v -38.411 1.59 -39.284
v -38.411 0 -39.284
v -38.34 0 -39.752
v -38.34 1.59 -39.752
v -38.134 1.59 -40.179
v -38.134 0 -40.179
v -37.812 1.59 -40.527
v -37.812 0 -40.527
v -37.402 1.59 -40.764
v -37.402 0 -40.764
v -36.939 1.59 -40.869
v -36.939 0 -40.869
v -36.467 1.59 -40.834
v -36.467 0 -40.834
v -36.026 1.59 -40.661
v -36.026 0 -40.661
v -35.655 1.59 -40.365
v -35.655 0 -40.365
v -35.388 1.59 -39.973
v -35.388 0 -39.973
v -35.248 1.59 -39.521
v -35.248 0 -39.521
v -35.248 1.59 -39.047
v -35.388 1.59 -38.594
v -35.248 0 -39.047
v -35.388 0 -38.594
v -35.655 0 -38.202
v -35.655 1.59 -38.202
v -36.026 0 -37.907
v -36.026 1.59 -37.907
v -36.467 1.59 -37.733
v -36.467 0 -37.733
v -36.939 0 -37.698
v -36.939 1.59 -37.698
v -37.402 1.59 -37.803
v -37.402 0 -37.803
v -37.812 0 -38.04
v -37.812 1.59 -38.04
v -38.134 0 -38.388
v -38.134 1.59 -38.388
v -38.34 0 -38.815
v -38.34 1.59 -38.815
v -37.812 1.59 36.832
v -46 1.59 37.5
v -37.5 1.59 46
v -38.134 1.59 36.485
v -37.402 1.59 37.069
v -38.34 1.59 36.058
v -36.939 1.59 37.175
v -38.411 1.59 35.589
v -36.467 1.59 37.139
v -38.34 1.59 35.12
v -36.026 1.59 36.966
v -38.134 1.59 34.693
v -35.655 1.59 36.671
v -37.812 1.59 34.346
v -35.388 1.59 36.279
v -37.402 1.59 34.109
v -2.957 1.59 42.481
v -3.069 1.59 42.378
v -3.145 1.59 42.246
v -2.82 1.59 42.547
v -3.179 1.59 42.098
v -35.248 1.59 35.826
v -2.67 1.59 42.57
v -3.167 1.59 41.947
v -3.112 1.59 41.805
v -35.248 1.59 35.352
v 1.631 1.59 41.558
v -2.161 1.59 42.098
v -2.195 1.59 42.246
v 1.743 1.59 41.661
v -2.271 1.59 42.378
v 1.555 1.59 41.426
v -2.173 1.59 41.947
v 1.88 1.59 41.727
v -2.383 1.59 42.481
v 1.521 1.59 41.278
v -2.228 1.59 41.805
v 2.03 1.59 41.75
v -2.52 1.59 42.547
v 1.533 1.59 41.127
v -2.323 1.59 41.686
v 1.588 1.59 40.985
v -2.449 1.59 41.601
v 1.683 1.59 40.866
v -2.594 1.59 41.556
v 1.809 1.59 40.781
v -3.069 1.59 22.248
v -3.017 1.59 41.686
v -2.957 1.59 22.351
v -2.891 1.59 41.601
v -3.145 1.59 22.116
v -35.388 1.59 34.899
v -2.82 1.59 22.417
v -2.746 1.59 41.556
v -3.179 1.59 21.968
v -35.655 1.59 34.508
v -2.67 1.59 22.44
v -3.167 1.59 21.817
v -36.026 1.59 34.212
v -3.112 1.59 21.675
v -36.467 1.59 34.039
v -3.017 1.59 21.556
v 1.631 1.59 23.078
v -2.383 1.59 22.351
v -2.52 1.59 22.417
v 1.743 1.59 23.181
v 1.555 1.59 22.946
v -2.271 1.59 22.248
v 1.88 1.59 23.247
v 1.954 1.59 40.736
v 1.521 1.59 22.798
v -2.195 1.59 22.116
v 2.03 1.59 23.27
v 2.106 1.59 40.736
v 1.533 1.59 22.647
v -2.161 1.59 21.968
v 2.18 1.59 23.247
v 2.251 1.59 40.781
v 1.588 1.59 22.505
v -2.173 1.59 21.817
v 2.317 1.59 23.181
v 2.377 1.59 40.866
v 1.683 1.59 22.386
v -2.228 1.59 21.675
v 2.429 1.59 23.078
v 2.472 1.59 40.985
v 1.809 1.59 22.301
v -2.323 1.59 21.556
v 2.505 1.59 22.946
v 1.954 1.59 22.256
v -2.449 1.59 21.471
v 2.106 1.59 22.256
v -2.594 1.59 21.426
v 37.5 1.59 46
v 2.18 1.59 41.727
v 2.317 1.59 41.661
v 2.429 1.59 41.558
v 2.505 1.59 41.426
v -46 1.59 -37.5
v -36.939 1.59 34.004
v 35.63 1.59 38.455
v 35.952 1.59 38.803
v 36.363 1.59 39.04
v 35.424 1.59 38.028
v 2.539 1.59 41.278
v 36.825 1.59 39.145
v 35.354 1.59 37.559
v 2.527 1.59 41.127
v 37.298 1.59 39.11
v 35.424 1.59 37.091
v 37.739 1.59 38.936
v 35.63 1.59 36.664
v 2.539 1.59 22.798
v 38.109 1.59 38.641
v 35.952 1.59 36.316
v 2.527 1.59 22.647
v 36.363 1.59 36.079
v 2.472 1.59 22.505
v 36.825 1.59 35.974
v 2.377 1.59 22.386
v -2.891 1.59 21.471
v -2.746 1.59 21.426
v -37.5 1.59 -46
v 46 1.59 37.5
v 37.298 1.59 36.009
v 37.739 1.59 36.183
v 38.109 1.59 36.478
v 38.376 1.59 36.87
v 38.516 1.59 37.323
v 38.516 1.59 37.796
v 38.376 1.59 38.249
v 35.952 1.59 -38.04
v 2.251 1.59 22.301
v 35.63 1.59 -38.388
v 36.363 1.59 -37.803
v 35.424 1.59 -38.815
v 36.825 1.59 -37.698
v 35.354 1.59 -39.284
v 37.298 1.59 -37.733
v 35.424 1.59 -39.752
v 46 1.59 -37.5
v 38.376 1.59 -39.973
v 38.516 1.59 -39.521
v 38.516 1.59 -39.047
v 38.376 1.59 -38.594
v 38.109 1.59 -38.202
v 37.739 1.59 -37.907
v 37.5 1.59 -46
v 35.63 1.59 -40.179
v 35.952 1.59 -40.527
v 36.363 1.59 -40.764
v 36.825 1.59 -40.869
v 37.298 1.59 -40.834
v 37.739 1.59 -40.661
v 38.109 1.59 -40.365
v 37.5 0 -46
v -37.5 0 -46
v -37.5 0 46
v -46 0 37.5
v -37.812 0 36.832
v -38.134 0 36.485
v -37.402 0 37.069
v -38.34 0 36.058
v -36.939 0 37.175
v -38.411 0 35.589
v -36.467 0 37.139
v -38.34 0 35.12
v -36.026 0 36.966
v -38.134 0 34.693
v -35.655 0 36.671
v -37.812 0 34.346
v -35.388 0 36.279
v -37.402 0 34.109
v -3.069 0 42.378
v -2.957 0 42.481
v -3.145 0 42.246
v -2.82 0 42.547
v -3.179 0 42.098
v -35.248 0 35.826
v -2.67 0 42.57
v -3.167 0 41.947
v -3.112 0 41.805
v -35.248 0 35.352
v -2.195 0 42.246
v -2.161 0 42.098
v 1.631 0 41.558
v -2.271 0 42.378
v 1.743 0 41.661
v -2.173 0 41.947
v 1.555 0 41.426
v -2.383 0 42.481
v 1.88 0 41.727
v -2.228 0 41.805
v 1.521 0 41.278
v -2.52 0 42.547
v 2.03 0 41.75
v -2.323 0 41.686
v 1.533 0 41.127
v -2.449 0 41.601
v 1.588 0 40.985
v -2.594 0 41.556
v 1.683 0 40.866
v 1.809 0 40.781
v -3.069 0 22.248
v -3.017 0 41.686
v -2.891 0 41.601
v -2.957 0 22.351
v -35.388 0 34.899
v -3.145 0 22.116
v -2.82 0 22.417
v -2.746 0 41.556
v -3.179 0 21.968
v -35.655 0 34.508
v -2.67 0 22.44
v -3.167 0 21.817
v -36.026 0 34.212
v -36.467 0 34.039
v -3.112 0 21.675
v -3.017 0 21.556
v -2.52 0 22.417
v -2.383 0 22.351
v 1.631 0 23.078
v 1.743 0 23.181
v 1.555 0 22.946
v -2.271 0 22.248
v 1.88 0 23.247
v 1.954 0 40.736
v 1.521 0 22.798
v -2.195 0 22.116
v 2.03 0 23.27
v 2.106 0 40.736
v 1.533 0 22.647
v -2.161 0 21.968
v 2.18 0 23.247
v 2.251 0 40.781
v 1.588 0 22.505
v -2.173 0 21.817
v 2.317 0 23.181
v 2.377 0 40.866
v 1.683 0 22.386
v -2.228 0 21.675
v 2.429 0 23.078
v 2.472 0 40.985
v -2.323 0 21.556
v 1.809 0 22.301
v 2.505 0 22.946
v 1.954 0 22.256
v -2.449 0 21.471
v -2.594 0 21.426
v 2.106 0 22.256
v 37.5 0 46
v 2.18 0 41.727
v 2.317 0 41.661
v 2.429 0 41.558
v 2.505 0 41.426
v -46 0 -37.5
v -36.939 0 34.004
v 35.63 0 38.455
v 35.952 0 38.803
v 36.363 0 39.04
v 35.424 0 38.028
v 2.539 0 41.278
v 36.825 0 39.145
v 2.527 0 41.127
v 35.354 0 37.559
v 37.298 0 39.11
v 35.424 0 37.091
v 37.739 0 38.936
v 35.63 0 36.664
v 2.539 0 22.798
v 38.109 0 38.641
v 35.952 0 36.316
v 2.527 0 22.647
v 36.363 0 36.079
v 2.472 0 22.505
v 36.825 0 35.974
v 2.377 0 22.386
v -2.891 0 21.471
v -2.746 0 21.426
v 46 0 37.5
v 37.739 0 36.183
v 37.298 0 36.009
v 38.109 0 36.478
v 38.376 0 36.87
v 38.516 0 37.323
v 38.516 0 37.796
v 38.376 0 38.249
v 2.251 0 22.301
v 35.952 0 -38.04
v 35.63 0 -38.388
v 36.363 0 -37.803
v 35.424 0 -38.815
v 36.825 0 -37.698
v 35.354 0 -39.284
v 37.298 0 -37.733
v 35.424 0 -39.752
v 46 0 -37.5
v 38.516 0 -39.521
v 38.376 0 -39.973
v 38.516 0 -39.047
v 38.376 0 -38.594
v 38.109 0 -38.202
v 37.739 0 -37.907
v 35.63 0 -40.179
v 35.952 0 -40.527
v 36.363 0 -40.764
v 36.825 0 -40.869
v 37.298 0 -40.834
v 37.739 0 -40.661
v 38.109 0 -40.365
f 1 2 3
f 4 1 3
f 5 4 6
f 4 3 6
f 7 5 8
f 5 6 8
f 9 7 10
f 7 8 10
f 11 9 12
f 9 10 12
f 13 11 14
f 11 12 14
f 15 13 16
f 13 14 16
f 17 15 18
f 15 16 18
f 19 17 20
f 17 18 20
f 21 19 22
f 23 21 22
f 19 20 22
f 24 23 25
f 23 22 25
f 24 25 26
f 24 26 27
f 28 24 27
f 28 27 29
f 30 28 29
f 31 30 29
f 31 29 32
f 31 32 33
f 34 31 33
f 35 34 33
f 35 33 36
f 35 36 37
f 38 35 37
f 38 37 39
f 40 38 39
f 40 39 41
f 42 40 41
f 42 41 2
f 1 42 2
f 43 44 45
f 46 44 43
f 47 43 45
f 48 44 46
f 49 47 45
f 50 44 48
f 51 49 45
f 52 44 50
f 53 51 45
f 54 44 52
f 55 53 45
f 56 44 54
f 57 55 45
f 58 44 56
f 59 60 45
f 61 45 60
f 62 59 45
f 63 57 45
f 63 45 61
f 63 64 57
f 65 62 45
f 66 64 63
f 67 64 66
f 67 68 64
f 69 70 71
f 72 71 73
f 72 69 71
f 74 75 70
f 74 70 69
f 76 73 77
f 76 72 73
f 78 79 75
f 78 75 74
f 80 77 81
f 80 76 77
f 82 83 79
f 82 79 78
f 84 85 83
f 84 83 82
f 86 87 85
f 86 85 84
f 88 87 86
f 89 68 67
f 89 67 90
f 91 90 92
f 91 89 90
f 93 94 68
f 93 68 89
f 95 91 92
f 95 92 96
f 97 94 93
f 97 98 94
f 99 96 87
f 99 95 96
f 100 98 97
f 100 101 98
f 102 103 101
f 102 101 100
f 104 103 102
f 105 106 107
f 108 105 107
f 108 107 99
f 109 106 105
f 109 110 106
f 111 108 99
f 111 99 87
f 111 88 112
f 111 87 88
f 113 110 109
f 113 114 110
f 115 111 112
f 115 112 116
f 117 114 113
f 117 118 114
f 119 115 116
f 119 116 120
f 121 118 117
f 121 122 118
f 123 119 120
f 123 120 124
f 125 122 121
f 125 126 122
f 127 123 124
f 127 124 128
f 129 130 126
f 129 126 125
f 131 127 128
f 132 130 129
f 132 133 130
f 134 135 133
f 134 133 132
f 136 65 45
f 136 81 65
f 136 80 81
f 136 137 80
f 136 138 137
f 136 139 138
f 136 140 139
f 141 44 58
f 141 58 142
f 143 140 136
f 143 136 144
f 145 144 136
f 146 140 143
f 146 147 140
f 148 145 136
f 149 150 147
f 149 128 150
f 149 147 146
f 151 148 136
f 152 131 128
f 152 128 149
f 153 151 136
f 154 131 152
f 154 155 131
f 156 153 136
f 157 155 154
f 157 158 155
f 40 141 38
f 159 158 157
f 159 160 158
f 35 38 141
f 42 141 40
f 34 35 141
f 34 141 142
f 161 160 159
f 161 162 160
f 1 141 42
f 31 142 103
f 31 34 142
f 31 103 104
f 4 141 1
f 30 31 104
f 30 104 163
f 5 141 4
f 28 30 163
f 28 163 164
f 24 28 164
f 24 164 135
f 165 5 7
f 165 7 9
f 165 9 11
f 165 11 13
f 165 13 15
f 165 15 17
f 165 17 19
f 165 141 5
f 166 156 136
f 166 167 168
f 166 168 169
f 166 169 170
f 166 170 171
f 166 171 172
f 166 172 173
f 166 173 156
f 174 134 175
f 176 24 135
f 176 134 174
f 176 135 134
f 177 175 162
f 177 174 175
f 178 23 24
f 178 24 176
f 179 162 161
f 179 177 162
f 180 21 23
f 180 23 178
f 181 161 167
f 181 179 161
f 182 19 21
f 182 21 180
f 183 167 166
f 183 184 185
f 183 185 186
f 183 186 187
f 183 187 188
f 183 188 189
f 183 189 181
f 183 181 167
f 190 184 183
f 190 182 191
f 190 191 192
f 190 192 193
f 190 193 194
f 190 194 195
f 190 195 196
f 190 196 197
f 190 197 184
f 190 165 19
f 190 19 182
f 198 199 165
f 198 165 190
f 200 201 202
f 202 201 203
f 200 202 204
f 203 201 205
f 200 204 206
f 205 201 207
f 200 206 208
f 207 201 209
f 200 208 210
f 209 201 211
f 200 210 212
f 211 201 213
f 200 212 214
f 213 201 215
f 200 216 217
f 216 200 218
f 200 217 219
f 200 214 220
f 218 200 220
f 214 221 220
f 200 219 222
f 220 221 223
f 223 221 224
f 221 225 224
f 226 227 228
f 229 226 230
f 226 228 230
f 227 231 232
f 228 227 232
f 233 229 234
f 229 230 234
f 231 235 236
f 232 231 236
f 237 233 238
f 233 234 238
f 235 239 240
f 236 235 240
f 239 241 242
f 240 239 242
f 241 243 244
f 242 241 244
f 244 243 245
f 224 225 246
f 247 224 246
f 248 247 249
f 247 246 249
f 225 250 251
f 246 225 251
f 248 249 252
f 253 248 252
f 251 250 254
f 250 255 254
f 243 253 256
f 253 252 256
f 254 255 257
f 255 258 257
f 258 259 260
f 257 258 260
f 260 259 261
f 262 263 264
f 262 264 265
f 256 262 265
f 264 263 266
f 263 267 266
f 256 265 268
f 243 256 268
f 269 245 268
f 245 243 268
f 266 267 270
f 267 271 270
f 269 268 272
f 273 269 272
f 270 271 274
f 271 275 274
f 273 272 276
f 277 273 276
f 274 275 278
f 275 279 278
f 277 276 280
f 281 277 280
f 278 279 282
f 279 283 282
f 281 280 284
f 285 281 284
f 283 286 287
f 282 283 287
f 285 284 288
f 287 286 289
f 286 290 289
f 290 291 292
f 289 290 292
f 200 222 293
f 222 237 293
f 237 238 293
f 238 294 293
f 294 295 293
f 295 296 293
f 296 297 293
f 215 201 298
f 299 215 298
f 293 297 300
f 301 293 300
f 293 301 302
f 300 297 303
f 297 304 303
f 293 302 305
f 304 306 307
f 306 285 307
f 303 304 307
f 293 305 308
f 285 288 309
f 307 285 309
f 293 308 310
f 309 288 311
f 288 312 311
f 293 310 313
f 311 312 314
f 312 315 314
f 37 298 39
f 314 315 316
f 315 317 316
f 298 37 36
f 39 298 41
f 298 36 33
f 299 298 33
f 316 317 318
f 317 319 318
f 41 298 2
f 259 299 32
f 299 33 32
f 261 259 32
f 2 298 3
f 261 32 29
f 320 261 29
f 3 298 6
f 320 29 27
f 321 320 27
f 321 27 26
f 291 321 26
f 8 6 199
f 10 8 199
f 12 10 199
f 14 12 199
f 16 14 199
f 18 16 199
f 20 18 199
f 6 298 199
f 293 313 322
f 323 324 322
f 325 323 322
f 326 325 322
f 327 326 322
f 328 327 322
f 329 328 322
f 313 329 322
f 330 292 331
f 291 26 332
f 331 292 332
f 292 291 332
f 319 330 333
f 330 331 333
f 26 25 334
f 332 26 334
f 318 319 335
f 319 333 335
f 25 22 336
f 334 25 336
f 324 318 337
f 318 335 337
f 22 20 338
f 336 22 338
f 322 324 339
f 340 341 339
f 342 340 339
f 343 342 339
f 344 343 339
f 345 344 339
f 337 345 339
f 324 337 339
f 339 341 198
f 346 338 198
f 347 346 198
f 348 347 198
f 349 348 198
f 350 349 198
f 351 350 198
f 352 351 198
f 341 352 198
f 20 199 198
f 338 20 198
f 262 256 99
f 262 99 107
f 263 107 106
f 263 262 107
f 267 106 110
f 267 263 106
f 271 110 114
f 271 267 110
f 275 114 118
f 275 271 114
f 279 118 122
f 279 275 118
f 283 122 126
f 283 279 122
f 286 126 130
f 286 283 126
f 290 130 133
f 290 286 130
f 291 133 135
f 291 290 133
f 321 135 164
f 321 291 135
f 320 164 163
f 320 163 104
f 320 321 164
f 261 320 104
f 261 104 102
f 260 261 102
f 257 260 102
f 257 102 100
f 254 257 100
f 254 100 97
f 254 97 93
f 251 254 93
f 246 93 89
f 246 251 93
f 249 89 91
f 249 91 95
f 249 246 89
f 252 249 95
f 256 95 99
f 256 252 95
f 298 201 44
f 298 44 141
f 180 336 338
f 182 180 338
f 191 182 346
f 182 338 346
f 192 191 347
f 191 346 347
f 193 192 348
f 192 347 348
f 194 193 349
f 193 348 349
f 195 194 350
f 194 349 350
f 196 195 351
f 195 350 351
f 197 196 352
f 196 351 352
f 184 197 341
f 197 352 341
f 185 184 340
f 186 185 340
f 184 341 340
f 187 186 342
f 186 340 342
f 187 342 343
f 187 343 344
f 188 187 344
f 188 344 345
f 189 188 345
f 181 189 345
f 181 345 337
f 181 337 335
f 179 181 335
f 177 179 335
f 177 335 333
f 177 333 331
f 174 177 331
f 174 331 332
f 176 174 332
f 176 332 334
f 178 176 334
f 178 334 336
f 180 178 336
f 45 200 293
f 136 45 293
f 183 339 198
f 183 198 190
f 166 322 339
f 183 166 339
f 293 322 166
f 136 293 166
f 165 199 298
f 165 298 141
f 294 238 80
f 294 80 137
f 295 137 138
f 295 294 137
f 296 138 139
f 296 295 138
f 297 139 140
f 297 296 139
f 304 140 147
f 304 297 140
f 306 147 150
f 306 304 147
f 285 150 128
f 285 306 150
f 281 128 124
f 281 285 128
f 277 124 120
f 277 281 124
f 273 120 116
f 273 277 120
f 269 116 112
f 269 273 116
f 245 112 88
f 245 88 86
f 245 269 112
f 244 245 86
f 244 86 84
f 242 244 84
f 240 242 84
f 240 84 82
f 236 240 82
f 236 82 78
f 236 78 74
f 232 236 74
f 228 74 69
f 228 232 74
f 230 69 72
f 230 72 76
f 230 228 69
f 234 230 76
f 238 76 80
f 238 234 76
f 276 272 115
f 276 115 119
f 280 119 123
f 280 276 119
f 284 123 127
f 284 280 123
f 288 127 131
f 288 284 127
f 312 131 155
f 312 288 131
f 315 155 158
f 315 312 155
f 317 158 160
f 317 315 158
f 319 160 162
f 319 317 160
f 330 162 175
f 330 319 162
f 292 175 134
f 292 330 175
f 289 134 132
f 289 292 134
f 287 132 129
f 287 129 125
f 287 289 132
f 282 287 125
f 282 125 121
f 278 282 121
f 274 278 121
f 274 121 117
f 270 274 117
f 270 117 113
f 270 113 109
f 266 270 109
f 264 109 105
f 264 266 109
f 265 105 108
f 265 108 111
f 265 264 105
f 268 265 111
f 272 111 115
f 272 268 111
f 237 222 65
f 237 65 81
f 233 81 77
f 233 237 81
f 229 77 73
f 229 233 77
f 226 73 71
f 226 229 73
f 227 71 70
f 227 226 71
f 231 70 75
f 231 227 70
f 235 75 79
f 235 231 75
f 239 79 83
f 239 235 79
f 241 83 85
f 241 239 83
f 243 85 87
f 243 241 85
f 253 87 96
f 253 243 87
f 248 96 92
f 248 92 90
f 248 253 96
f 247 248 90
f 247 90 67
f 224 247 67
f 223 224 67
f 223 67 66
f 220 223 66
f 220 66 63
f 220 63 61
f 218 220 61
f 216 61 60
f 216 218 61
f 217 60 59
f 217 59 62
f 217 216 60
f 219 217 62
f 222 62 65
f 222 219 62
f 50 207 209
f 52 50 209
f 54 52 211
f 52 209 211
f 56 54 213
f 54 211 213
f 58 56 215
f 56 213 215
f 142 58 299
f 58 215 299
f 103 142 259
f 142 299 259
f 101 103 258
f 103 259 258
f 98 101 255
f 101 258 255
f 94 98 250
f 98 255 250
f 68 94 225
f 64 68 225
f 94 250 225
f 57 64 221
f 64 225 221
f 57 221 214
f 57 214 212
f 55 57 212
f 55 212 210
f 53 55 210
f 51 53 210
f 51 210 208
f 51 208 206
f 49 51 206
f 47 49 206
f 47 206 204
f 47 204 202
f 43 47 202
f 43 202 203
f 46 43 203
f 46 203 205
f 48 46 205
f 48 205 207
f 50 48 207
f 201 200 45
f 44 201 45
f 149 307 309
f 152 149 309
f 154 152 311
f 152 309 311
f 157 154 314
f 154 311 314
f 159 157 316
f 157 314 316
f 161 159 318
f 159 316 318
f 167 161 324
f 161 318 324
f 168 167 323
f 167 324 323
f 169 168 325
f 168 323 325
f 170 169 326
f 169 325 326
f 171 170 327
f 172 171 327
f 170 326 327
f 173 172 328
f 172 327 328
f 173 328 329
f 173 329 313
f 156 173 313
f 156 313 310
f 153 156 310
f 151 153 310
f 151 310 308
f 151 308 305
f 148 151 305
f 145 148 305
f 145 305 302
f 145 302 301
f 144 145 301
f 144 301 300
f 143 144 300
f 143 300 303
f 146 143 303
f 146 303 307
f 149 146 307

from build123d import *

# Parameters (mm, degrees)
SKETCH1_W             = 92
SKETCH1_H             = 92
SKETCH1_R             = 0.51
BOSS_EXTRUDE1_DEPTH   = 1.59
CHAMFER1_SIZE         = 8.5
F_1_0MM_DOWEL_HOLE1_D = 3.18


with BuildPart() as part:
    # Sketch1 → Boss-Extrude1 (new body)
    with BuildSketch(Plane(origin=(0, 0, 0), x_dir=(1, 0, 0), z_dir=(0, 1, 0))):
        Rectangle(SKETCH1_W, SKETCH1_H)
        with Locations(Location((-2.67, -21.93, 0), (0, 0, 270))):
            Circle(SKETCH1_R, mode=Mode.SUBTRACT)
        with Locations(Location((2.03, -22.76, 0), (0, 0, 270))):
            Circle(SKETCH1_R, mode=Mode.SUBTRACT)
        with Locations(Location((-2.67, -42.06, 0), (0, 0, 270))):
            Circle(SKETCH1_R, mode=Mode.SUBTRACT)
        with Locations(Location((2.03, -41.24, 0), (0, 0, 270))):
            Circle(SKETCH1_R, mode=Mode.SUBTRACT)
    extrude(amount=BOSS_EXTRUDE1_DEPTH)

    # Chamfer1
    chamfer1_edges = [part.edges().sort_by_distance(p)[0] for p in [
        (46, 0.795, 46),
        (-46, 0.795, 46),
        (-46, 0.795, -46),
        (46, 0.795, -46),
    ]]
    chamfer(chamfer1_edges, length=CHAMFER1_SIZE)

    # Ø1.0mm Dowel Hole1 (through all)
    with Locations(Plane(origin=(0, 1.59, 0), x_dir=(1, 0, 0), z_dir=(0, 1, 0))):
        with Locations((-36.820611538, -35.589152958), (36.943757396, -37.559486686), (36.943757396, 39.283528698), (-36.820611538, 39.283528698)):
            Hole(F_1_0MM_DOWEL_HOLE1_D / 2)


solid = part.part
